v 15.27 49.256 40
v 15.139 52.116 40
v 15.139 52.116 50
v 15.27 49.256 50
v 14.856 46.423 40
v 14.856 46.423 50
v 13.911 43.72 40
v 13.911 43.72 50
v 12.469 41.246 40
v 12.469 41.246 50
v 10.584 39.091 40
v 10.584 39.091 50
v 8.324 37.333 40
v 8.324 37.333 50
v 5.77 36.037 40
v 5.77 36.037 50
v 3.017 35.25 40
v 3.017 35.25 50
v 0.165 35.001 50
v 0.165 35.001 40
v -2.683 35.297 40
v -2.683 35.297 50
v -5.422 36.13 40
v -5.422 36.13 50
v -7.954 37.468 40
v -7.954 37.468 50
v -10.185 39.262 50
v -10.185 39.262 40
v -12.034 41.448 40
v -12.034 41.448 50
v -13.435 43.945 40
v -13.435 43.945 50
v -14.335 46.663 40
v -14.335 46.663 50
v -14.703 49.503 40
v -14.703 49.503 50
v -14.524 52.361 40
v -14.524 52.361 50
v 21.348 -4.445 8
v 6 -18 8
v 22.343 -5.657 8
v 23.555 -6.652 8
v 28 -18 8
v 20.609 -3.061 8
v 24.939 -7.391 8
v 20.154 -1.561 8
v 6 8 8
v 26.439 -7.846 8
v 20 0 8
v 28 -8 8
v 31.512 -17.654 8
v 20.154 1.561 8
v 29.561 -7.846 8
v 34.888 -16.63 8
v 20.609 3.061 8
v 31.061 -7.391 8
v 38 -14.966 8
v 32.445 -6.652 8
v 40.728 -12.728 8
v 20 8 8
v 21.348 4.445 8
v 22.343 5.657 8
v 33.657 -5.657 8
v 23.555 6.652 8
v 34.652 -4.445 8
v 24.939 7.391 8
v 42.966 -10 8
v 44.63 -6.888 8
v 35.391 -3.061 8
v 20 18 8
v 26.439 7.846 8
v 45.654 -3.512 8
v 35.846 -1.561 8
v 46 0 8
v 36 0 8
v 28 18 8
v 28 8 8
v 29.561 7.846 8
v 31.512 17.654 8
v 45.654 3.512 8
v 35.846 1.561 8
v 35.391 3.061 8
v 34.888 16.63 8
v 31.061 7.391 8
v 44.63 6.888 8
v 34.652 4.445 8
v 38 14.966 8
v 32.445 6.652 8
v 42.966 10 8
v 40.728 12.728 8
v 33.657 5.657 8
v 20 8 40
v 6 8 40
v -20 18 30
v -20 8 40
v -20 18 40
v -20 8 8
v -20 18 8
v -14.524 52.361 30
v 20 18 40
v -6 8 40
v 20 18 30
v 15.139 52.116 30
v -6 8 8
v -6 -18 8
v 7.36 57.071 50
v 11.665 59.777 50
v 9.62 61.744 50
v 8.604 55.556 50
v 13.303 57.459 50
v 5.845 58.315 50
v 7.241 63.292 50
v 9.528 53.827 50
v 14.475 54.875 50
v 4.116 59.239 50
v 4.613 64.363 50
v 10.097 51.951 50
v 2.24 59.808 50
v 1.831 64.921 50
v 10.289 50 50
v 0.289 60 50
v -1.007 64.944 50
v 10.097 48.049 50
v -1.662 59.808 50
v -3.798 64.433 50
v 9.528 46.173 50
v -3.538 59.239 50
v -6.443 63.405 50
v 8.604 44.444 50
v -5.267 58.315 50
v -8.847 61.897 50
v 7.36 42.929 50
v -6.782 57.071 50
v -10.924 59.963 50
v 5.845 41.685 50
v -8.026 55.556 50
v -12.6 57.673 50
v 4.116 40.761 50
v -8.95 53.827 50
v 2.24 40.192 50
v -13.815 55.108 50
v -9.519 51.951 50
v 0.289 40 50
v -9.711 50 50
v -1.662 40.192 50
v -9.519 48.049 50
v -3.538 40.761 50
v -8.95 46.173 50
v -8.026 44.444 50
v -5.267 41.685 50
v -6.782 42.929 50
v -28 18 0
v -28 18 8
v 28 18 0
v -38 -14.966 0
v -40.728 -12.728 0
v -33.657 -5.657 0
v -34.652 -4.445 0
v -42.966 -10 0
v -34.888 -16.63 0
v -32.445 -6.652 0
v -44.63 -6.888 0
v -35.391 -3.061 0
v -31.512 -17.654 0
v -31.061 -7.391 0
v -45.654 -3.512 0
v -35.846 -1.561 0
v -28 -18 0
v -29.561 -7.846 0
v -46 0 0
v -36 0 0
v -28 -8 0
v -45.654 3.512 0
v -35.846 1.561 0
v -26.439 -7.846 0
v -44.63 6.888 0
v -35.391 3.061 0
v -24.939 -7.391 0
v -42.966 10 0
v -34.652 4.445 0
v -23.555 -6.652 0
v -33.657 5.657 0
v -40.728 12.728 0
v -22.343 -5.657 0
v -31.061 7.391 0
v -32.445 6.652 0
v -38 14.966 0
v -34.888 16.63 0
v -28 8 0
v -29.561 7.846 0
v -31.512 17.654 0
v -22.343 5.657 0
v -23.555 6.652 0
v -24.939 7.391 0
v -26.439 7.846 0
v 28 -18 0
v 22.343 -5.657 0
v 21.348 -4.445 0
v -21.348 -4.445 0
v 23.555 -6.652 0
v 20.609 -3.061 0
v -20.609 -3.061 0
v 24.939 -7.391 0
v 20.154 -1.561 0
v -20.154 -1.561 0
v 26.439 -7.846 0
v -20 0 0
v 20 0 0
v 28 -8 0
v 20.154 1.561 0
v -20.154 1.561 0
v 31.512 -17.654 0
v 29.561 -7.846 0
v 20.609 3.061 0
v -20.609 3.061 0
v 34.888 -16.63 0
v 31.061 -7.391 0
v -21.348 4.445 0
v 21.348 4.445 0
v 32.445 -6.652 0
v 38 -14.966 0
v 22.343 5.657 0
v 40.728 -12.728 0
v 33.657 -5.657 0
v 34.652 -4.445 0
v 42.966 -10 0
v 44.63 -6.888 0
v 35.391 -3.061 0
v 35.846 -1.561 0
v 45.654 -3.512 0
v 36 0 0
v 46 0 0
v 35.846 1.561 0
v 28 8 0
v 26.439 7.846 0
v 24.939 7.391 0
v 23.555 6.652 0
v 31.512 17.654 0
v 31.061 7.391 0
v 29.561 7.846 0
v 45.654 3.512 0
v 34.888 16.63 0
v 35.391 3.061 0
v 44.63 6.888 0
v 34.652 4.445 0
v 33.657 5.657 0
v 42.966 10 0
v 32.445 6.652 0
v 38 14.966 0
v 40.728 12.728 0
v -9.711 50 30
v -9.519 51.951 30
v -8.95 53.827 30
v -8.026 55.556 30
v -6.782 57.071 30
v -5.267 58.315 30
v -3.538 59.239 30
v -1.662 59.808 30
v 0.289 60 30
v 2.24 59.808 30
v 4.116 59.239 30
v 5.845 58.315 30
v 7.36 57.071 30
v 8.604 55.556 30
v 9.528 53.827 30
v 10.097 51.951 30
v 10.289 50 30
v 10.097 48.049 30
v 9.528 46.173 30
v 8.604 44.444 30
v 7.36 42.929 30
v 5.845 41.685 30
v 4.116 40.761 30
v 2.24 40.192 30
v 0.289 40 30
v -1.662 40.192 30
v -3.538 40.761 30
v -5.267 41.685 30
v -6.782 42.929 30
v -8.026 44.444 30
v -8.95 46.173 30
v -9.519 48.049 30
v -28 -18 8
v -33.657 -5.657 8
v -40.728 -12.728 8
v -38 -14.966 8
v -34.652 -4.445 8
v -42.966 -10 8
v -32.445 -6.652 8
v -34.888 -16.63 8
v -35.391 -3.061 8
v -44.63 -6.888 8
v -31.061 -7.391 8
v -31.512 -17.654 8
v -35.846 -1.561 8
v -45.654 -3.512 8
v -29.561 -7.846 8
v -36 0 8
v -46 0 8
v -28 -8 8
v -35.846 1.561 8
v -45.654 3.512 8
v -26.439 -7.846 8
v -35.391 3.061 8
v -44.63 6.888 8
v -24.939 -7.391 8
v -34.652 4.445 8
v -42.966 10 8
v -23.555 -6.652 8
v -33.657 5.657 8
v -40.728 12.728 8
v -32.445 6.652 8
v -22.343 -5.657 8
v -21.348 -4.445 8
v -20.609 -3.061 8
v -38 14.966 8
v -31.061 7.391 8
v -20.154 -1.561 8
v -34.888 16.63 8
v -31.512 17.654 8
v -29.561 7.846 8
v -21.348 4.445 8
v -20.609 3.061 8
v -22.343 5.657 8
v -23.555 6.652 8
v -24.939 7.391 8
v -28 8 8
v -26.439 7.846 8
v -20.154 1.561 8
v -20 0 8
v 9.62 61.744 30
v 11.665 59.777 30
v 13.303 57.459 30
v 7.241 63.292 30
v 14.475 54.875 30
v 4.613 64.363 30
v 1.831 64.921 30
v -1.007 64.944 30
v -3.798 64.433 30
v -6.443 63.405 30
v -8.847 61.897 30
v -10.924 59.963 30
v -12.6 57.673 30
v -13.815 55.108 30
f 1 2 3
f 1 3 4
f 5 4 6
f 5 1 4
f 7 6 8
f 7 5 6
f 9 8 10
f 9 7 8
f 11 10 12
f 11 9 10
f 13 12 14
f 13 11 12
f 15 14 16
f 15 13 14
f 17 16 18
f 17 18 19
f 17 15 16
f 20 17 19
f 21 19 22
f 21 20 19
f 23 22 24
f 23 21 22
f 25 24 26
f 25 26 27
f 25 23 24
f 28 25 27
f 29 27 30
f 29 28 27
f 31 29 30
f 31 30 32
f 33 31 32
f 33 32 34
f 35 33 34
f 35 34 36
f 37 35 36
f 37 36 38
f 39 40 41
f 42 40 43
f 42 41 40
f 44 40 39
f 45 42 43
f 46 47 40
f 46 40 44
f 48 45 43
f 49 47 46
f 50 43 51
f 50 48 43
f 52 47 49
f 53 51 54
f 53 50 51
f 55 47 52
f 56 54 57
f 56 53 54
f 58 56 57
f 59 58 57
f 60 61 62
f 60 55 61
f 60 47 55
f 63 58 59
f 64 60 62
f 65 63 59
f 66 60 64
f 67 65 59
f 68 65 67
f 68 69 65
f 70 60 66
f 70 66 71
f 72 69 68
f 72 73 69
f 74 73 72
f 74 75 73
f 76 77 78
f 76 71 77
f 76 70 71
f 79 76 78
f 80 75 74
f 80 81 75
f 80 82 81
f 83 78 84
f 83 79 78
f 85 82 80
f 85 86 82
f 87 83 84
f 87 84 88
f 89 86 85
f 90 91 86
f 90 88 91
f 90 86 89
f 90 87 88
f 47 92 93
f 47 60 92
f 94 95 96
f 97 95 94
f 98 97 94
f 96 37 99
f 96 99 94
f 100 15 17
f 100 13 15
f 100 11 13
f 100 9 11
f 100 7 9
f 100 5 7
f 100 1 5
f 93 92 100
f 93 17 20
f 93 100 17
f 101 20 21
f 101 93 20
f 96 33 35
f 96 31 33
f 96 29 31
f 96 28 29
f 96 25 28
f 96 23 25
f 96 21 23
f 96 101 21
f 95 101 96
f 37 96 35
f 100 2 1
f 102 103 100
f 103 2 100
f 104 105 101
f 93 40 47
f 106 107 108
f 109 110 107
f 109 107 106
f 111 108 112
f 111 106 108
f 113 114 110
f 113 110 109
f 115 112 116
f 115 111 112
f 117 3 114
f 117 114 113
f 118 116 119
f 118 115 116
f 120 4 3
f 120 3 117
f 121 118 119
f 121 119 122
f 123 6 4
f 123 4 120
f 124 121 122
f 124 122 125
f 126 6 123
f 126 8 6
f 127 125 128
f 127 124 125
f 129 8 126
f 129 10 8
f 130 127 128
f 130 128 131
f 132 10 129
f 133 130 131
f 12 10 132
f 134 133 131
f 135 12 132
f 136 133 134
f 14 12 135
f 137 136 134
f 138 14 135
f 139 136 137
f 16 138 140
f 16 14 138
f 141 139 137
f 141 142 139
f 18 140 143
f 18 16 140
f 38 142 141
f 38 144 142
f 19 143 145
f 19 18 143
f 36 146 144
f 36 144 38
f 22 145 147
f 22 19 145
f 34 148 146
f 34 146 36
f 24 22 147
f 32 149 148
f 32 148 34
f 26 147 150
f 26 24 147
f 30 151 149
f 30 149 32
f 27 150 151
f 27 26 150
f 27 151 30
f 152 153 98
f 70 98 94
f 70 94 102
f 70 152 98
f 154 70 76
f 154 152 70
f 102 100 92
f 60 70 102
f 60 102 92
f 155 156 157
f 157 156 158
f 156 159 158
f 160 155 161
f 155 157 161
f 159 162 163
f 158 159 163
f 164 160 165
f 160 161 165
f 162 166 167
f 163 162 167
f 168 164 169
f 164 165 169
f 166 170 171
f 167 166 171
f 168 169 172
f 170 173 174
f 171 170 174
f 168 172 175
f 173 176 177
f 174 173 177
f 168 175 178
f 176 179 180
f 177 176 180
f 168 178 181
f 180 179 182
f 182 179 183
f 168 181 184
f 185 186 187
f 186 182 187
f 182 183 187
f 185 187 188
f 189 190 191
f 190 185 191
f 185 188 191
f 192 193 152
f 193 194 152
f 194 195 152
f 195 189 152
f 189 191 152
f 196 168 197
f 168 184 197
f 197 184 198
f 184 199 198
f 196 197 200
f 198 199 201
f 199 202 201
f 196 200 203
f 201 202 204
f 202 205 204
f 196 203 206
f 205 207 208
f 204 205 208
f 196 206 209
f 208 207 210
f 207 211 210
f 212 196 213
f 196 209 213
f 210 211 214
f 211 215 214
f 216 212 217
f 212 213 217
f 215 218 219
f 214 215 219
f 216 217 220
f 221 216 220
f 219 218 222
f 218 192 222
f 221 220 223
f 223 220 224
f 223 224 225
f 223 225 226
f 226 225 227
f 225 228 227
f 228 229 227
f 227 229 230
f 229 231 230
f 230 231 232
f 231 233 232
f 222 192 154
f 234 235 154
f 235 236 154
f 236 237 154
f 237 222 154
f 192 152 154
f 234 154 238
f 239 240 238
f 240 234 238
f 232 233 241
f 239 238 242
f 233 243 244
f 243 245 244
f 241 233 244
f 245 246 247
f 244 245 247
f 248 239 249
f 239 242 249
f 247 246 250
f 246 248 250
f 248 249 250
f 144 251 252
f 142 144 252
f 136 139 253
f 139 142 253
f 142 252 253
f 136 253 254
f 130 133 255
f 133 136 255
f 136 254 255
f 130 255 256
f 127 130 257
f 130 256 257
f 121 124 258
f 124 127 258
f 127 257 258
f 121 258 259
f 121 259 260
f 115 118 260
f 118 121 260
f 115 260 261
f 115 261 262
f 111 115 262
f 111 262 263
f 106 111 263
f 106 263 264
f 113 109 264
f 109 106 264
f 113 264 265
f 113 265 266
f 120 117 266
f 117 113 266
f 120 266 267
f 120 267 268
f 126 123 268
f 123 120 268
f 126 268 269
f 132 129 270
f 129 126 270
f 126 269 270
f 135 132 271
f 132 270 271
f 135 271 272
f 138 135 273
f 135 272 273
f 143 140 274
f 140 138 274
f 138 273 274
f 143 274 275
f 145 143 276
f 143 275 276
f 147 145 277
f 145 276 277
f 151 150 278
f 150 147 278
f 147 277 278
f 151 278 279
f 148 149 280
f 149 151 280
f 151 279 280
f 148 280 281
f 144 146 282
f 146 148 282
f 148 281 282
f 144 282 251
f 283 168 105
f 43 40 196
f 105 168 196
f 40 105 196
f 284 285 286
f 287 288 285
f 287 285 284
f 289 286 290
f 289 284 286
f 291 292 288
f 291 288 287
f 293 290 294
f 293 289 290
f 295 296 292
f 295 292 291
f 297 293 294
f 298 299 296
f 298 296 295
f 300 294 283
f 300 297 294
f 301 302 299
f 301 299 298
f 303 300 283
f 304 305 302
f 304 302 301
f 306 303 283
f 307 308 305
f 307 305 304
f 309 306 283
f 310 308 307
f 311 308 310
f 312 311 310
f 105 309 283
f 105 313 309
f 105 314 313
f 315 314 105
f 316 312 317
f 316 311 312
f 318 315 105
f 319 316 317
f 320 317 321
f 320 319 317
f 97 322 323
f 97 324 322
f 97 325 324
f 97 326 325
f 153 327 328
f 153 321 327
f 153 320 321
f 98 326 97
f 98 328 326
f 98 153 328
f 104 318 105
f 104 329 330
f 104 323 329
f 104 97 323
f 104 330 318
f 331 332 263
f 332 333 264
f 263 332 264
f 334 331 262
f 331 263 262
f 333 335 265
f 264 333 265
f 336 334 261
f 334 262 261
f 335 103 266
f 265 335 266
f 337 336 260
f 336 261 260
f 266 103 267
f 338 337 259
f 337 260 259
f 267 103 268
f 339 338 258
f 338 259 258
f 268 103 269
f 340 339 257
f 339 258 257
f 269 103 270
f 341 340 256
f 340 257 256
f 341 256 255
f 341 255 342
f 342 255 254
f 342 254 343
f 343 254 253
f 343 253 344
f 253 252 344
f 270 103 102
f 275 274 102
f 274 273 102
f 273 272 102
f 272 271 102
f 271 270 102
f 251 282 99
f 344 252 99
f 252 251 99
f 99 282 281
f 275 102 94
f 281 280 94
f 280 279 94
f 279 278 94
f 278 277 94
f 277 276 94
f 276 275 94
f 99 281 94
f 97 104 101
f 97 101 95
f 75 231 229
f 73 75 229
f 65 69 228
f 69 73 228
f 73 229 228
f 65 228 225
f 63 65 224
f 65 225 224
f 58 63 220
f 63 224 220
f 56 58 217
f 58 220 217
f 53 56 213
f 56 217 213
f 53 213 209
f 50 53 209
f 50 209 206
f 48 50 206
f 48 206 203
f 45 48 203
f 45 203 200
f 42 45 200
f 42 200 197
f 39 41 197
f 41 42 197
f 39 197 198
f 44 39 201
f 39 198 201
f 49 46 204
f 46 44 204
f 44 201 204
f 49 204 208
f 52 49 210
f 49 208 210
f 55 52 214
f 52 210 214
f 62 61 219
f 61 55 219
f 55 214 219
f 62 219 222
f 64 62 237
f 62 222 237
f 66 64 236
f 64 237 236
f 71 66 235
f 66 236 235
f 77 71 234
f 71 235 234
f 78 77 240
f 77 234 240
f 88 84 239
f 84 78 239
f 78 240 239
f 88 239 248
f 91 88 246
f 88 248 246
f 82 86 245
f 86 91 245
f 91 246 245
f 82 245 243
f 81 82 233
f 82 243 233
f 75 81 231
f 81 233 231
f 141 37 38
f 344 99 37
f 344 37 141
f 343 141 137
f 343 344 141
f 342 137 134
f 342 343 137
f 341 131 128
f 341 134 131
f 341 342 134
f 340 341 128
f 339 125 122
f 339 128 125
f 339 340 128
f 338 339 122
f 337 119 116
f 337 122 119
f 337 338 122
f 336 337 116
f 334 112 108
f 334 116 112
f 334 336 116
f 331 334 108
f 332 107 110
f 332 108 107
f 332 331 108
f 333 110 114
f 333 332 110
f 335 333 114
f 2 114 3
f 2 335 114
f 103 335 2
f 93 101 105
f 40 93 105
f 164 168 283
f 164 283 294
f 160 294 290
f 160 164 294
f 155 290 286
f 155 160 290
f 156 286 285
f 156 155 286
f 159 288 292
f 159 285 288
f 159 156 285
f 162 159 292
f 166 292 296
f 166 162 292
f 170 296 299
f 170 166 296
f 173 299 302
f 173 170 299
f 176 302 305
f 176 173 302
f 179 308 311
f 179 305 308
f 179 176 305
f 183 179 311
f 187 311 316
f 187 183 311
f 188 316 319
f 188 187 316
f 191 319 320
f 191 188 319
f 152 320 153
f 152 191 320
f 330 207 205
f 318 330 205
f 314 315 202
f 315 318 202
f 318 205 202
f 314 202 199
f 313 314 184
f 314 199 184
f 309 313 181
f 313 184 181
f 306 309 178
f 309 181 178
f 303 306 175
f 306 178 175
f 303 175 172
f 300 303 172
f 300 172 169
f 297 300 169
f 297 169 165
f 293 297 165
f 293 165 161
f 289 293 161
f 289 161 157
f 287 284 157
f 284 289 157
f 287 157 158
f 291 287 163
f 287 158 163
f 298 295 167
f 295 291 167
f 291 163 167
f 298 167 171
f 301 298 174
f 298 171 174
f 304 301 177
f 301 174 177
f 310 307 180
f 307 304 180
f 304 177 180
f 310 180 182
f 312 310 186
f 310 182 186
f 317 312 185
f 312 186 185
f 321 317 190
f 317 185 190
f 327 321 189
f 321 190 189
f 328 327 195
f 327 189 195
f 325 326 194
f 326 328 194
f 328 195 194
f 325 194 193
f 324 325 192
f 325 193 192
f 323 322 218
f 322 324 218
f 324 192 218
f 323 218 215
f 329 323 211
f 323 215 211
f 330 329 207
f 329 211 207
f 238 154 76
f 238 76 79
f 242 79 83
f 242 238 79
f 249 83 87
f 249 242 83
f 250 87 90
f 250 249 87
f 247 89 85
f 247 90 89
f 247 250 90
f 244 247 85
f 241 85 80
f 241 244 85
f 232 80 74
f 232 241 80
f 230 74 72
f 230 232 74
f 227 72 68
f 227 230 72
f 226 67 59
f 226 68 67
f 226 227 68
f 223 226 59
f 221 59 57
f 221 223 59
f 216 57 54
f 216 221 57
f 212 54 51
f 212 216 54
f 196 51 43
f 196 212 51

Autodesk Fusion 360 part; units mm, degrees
sketch "Sketch1" plane through (0, 0, 0) normal (0, 0, 1) x (1, 0, 0)
  circle A0 centre (-28, 0) radius 8
  line L0 (0, 0) -> (0, 62.0025)
  circle A1 centre (28, 0) radius 8
  line L1 (-28, 18) -> (28, 18)
  line L2 (-28, -18) -> (28, -18)
  arc A2 (28, -18) -> (28, 18) centre (28, 0) ccw
  arc A3 (-28, 18) -> (-28, -18) centre (-28, 0) ccw
  dimension "d1" = 16
  dimension "d2" = 36
  dimension "d3" = 28
extrude "Extrude1" add sketch "Sketch1" along normal blind 8
sketch "Sketch2" plane through (0, 0, 8) normal (0, 0, 1) x (-1, 0, 0)
  circle A0 centre (28, 0) radius 8
  circle A1 centre (-28, 0) radius 8
  arc A2 (28, -18) -> (28, 18) centre (28, 0) ccw
  line L0 (28, 18) -> (-28, 18)
  arc A3 (-28, 18) -> (-28, -18) centre (-28, 0) ccw
  line L1 (-28, -18) -> (28, -18)
sketch "Sketch3" plane through (0, 0, 8) normal (0, 0, 1) x (-1, 0, 0)
  line L0 (20, -18) -> (-20, -18)
  line L1 (-20, -18) -> (-20, -8)
  line L2 (-20, -8) -> (20, -8)
  line L3 (20, -8) -> (20, -18)
  dimension "d6" = 40
  dimension "d7" = 10
  dimension "d8" = 20
extrude "Extrude2" add sketch "Sketch3" along normal blind 32
sketch "Sketch4" plane through (0, 0, 40) normal (0, 0, 1) x (-1, 0, 0)
  line L0 (20, -8) -> (-20, -8)
  line L1 (-20, -8) -> (-20, -18)
  line L2 (-20, -18) -> (20, -18)
  line L3 (20, -18) -> (20, -8)
  circle A0 centre (-0.2889, -50) radius 10
  line L4 (14.5242, -52.3607) -> (20, -18)
  line L5 (-15.1389, -52.1159) -> (-20, -18)
  arc A1 (-15.1389, -52.1159) -> (14.5242, -52.3607) centre (-0.2889, -50) ccw
  dimension "d11" = 20
  dimension "d12" = 30
  dimension "d13" = 32
extrude "Extrude3" add sketch "Sketch4" against normal blind 10 contours L2 L4 L5 A1
sketch "Sketch5" plane through (0, 0, 40) normal (0, 0, 1) x (-1, 0, 0)
  circle A0 centre (-0.2889, -50) radius 10
  line L0 (20, -8) -> (-20, -8)
  line L1 (-20, -8) -> (-20, -18)
  line L2 (-20, -18) -> (-15.1389, -52.1159)
  arc A1 (-15.1389, -52.1159) -> (14.5242, -52.3607) centre (-0.2889, -50) ccw
  line L3 (14.5242, -52.3607) -> (20, -18)
  line L4 (20, -18) -> (20, -8)
  circle A2 centre (-0.2889, -50) radius 10
  circle A3 centre (-0.2889, -50) radius 15
  dimension "d16" = 20
  dimension "d17" = 30
extrude "Extrude4" add sketch "Sketch5" along normal blind 10 contours A1 A3
sketch "Sketch6" plane through (0, 0, 0) normal (1, 0, 0) x (0, 1, 0)
  line L0 (8, 40, -20) -> (8, 40, 20)
  line L1 (-18, 8, -28) -> (-18, 8, 28)
  line L2 (8, 40) -> (-18, 8)
  line L3 (8, 8, 20) -> (8, 8, -20)
  line L4 (-18, 8) -> (8, 8)
  line L5 (8, 40) -> (8, 8)
extrude "Extrude5" add sketch "Sketch6" along normal blind 6 and the other way blind 6
